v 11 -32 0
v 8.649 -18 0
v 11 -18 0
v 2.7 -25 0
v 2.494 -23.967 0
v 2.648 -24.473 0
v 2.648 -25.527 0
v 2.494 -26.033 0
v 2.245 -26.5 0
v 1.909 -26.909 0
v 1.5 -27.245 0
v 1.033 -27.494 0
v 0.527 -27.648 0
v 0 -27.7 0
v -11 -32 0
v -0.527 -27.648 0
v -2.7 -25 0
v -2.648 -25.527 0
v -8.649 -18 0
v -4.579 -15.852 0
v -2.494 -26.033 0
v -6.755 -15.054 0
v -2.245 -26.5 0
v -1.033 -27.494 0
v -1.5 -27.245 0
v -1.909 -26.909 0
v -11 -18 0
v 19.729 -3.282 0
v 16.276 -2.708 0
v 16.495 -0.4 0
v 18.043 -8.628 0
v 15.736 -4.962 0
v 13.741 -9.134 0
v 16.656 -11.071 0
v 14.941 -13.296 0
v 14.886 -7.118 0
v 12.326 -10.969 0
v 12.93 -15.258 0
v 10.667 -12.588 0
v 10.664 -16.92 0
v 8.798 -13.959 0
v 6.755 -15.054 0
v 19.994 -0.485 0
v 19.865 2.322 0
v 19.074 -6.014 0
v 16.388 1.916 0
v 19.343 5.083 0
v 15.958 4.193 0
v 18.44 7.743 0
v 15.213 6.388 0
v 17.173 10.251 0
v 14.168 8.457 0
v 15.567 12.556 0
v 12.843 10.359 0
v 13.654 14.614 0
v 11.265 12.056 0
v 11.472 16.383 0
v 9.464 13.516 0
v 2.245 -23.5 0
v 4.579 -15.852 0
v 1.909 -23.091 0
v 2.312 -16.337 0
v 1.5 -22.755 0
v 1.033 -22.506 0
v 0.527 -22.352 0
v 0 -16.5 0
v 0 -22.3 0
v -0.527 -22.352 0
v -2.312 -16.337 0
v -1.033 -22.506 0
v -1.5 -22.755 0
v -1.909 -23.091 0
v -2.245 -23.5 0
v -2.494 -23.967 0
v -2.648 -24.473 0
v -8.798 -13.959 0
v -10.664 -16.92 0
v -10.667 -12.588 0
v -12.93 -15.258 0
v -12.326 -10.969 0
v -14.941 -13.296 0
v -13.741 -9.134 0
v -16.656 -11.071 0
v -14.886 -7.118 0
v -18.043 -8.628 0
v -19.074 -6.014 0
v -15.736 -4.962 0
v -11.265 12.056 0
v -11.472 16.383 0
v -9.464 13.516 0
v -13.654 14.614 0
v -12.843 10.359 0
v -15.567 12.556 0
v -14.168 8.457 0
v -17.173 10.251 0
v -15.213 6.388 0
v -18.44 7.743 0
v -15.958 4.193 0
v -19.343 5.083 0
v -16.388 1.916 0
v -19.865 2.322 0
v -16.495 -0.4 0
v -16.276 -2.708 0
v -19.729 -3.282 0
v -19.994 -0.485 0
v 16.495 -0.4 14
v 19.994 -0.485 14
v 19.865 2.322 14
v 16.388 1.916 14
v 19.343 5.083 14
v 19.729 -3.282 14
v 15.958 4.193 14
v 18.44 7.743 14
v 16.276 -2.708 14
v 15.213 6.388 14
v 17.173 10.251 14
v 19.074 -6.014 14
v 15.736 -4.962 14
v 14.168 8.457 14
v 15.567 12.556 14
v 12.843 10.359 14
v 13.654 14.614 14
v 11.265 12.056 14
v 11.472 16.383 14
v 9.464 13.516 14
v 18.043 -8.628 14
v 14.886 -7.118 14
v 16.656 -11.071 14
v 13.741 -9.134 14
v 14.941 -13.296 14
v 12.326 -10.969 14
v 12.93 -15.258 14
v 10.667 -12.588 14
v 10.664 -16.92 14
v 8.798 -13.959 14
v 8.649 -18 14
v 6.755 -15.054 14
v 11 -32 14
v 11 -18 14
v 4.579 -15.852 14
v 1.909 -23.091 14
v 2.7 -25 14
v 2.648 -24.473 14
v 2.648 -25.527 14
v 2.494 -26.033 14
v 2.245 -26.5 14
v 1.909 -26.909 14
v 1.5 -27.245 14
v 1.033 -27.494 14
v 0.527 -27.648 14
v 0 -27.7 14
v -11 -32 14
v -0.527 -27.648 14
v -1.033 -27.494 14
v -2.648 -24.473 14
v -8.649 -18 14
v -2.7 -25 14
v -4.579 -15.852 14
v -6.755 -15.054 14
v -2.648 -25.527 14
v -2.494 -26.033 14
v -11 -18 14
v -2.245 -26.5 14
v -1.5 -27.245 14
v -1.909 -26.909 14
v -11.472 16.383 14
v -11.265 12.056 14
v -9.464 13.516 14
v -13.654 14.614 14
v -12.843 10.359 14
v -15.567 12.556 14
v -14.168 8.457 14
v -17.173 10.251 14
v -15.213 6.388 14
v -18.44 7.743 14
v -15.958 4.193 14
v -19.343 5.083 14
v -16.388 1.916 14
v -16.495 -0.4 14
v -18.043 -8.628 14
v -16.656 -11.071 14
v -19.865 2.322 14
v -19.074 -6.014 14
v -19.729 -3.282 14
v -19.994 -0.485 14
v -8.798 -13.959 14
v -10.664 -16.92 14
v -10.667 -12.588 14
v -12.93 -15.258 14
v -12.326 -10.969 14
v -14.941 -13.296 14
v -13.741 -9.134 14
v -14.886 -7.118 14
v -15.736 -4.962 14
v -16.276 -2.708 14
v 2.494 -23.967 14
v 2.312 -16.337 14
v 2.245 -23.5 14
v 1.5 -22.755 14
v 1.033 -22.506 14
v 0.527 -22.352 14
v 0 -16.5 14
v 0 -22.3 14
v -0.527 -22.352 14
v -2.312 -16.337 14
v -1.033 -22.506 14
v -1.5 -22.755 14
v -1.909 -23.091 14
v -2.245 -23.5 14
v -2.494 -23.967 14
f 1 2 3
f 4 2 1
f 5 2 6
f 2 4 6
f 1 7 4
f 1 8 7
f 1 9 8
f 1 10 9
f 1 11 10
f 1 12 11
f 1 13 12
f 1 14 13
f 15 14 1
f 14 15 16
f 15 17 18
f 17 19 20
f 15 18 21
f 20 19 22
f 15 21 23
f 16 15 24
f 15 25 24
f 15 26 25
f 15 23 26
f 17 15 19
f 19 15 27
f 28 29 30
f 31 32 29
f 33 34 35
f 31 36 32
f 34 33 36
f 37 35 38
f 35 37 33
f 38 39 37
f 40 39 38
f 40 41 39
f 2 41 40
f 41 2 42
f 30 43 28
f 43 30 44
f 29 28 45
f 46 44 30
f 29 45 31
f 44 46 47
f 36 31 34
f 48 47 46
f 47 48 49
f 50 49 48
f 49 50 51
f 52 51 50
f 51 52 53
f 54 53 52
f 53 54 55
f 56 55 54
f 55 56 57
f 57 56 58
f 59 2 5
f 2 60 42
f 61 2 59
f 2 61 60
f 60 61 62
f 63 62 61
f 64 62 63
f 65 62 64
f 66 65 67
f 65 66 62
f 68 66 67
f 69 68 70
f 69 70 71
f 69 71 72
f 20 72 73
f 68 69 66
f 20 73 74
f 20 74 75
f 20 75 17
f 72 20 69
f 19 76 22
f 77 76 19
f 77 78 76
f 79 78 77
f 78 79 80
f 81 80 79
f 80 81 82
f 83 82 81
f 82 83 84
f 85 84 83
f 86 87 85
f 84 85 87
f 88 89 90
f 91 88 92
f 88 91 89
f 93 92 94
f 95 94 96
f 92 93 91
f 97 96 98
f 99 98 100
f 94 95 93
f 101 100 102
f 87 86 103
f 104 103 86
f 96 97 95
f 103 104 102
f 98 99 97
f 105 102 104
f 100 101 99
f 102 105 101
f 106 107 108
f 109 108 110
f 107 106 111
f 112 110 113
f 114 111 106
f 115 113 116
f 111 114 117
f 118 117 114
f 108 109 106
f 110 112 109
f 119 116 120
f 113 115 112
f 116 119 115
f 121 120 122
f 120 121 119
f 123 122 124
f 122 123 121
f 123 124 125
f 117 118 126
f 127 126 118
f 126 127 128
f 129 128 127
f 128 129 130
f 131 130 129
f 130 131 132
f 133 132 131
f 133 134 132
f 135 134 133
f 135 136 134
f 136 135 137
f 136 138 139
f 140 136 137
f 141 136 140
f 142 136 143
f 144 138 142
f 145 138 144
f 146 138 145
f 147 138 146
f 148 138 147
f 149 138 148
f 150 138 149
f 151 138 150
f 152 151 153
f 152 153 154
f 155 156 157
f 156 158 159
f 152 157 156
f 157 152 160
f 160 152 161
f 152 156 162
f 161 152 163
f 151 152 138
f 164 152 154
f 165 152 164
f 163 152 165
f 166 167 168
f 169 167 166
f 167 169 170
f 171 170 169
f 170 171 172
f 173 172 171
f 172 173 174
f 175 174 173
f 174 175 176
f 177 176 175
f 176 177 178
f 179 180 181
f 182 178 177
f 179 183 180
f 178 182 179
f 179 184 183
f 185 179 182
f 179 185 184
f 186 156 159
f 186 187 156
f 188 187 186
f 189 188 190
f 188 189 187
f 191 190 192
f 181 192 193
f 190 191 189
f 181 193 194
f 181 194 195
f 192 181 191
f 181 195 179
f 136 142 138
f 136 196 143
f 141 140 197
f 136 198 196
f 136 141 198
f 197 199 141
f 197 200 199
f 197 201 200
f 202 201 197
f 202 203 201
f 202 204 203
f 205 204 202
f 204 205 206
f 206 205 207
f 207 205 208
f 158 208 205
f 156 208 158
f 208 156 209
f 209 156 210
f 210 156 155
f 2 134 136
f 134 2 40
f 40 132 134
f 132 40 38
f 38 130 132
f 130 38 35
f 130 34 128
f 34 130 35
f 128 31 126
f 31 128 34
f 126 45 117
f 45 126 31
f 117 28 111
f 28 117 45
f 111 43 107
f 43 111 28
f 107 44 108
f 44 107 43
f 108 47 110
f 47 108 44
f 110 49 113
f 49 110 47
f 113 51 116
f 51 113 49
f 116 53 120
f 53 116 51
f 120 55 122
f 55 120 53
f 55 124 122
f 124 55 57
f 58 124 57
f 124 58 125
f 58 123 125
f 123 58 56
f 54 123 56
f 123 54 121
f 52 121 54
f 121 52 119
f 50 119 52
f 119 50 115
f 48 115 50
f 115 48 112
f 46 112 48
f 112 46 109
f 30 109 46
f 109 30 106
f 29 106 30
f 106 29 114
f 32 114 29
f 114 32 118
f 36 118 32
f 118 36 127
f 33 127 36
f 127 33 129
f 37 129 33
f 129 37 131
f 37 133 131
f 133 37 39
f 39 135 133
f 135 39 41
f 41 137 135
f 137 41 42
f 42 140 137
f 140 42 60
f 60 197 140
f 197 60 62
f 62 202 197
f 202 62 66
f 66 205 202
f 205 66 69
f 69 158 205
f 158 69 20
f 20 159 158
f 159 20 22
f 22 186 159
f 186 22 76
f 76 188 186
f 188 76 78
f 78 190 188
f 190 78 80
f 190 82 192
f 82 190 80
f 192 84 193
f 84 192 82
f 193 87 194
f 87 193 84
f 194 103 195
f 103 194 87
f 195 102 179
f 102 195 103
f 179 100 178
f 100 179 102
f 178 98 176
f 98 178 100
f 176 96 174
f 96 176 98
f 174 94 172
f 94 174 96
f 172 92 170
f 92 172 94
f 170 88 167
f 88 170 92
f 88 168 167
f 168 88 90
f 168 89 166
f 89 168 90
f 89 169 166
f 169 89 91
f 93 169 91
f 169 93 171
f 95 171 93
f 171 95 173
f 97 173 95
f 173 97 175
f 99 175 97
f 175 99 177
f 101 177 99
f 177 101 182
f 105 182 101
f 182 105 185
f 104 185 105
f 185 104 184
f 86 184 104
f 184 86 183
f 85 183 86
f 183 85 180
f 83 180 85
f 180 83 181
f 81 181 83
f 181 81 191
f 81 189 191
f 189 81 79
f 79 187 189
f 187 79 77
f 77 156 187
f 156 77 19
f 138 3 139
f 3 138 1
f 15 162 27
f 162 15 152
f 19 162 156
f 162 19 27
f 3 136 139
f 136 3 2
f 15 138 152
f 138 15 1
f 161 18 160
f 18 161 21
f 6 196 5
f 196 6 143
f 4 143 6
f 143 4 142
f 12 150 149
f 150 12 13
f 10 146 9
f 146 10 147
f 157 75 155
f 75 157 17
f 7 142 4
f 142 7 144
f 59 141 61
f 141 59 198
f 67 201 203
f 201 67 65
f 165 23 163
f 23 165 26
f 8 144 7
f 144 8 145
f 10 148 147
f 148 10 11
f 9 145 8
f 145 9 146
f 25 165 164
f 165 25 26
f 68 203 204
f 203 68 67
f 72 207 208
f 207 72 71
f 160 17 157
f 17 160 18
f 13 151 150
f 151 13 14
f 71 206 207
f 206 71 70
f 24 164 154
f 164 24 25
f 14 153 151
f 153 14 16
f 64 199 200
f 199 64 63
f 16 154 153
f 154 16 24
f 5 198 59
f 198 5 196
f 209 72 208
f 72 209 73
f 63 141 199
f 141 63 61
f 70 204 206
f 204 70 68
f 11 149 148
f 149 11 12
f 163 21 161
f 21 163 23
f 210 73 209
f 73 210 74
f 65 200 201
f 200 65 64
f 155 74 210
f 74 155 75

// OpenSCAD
$fn = 32;

// ----------------------------------------------------------------------
// Spring clip: 40 mm outside, 3.5 mm band, 70 degree opening
// ----------------------------------------------------------------------

// --- parameters (mm) ---
outer_r = 20;             // clip outside radius
inner_r = 16.5;           // clip bore radius
band = 3.5;               // band thickness
clip_w = 14;              // clip width
opening = 70;             // opening angle
tab_w = 22;               // tab width
tab_len = 12;             // tab length past the clip
tab_hole = 5.4;           // tab fixing hole

clip_profile = [[-11.472, 16.383], [-13.654, 14.614], [-15.567, 12.556], [-17.173, 10.251], [-18.44, 7.743], [-19.343, 5.083], [-19.865, 2.322], [-19.994, -0.485], [-19.729, -3.282], [-19.074, -6.014], [-18.043, -8.628], [-16.656, -11.071], [-14.941, -13.296], [-12.93, -15.258], [-10.664, -16.92], [-8.188, -18.247], [-5.55, -19.215], [-2.803, -19.803], [0, -20], [2.803, -19.803], [5.55, -19.215], [8.188, -18.247], [10.664, -16.92], [12.93, -15.258], [14.941, -13.296], [16.656, -11.071], [18.043, -8.628], [19.074, -6.014], [19.729, -3.282], [19.994, -0.485], [19.865, 2.322], [19.343, 5.083], [18.44, 7.743], [17.173, 10.251], [15.567, 12.556], [13.654, 14.614], [11.472, 16.383], [9.464, 13.516], [11.265, 12.056], [12.843, 10.359], [14.168, 8.457], [15.213, 6.388], [15.958, 4.193], [16.388, 1.916], [16.495, -0.4], [16.276, -2.708], [15.736, -4.962], [14.886, -7.118], [13.741, -9.134], [12.326, -10.969], [10.667, -12.588], [8.798, -13.959], [6.755, -15.054], [4.579, -15.852], [2.312, -16.337], [0, -16.5], [-2.312, -16.337], [-4.579, -15.852], [-6.755, -15.054], [-8.798, -13.959], [-10.667, -12.588], [-12.326, -10.969], [-13.741, -9.134], [-14.886, -7.118], [-15.736, -4.962], [-16.276, -2.708], [-16.495, -0.4], [-16.388, 1.916], [-15.958, 4.193], [-15.213, 6.388], [-14.168, 8.457], [-12.843, 10.359], [-11.265, 12.056], [-9.464, 13.516]];

difference() {
  union() {
    linear_extrude(height = clip_w) polygon(clip_profile);
    /* mounting tab, sunk 2 mm into the band */
    translate([-11, -32, 0]) cube([tab_w, 14, clip_w]);
  }
  translate([0, -25, -2.5]) cylinder(h = clip_w + 5, d = tab_hole);
}
